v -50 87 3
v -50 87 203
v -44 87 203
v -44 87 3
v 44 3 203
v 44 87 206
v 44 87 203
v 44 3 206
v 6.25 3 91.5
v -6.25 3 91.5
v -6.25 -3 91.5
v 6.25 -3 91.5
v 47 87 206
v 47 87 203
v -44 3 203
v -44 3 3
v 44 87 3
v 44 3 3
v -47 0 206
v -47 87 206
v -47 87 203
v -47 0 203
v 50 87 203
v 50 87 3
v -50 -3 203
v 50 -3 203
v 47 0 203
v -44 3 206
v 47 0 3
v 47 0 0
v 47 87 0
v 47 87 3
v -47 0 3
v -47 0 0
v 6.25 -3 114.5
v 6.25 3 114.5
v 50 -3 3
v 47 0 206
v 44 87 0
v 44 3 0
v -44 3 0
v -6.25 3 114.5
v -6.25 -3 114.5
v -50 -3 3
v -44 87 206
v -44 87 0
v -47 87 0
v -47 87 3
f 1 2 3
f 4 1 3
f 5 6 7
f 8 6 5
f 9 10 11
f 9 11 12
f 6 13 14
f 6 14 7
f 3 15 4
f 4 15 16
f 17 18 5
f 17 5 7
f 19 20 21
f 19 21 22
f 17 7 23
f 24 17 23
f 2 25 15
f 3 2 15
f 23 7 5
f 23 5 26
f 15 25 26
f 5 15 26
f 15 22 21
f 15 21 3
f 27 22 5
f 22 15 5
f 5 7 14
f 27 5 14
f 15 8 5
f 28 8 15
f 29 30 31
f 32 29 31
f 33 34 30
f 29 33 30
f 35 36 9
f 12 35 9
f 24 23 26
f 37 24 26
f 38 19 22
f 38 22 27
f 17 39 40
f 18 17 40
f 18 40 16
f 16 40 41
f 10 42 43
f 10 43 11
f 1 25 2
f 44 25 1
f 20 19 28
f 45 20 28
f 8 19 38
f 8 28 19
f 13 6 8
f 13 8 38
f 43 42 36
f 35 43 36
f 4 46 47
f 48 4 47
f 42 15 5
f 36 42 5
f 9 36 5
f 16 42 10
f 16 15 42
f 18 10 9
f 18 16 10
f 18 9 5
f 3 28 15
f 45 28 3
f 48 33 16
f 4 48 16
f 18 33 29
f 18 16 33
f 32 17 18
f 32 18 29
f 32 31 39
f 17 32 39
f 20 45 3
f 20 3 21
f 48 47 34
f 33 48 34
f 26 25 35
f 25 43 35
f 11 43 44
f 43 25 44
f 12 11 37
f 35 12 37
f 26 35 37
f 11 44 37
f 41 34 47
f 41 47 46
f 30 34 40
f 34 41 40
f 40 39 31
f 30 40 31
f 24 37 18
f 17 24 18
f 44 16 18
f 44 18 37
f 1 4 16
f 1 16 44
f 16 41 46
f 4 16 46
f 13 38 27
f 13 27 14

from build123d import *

# Parameters (mm, degrees)
SALIENTE_EXTRUIR1_DEPTH = 3
SALIENTE_EXTRUIR2_DEPTH = 100
SIMETR_A2_START         = -3
SIMETR_A2_OUTLINE_W     = 6
SIMETR_A2_OUTLINE_H     = 100
SIMETR_A2_DEPTH         = 90
SIMETR_A2_2_OUTLINE_W   = 88
SIMETR_A2_2_OUTLINE_H   = 100
SIMETR_A2_2_DEPTH       = 6
CROQUIS3_W              = 12.5
CROQUIS3_H              = 23
CORTAR_EXTRUIR1_DEPTH   = 6


# Read off the part's stored shape, not the designer's step: Simetría2
with BuildPart() as part:
    # Croquis1 → Saliente-Extruir1 (new body)
    with BuildSketch(Plane.XY):
        Polygon((-47, 0), (47, 0), (47, 87), (44, 87), (44, 3), (-44, 3), (-44, 87), (-47, 87), align=None)
    extrude(amount=SALIENTE_EXTRUIR1_DEPTH)


with BuildPart() as body_2:
    # Croquis2 → Saliente-Extruir2 (new body)
    with BuildSketch(Plane.XY.offset(3)):
        Polygon((-44, 87), (-44, 3), (44, 3), (44, 87), (50, 87), (50, -3), (-50, -3), (-50, 87), align=None)
    extrude(amount=SALIENTE_EXTRUIR2_DEPTH)

    # Simetría2 outline → Simetría2 (add)
    with BuildSketch(Plane(origin=(0, 0, 0), x_dir=(1, 0, 0), z_dir=(0, 1, 0)).offset(SIMETR_A2_START)):
        with Locations((-47, -153)):
            Rectangle(SIMETR_A2_OUTLINE_W, SIMETR_A2_OUTLINE_H)
        with Locations((47, -153)):
            Rectangle(SIMETR_A2_OUTLINE_W, SIMETR_A2_OUTLINE_H)
    extrude(amount=SIMETR_A2_DEPTH)

    # Simetr_a2 2 outline → Simetr_a2 2 (add)
    with BuildSketch(Plane(origin=(0, 0, 0), x_dir=(1, 0, 0), z_dir=(0, 1, 0)).offset(SIMETR_A2_START)):
        with Locations((0, -153)):
            Rectangle(SIMETR_A2_2_OUTLINE_W, SIMETR_A2_2_OUTLINE_H)
    extrude(amount=SIMETR_A2_2_DEPTH)

    # Croquis3 → Cortar-Extruir1 (cut)
    with BuildSketch(Plane(origin=(0, 3, 0), x_dir=(1, 0, 0), z_dir=(0, 1, 0))):
        with Locations((0, -103)):
            Rectangle(CROQUIS3_W, CROQUIS3_H)
    extrude(amount=-CORTAR_EXTRUIR1_DEPTH, mode=Mode.SUBTRACT)


with BuildPart() as body_3:
    # Simetría3: mirrored copy
    add(part.part.mirror(Plane.XY.offset(103)))


solid = Compound([part.part, body_2.part, body_3.part])
